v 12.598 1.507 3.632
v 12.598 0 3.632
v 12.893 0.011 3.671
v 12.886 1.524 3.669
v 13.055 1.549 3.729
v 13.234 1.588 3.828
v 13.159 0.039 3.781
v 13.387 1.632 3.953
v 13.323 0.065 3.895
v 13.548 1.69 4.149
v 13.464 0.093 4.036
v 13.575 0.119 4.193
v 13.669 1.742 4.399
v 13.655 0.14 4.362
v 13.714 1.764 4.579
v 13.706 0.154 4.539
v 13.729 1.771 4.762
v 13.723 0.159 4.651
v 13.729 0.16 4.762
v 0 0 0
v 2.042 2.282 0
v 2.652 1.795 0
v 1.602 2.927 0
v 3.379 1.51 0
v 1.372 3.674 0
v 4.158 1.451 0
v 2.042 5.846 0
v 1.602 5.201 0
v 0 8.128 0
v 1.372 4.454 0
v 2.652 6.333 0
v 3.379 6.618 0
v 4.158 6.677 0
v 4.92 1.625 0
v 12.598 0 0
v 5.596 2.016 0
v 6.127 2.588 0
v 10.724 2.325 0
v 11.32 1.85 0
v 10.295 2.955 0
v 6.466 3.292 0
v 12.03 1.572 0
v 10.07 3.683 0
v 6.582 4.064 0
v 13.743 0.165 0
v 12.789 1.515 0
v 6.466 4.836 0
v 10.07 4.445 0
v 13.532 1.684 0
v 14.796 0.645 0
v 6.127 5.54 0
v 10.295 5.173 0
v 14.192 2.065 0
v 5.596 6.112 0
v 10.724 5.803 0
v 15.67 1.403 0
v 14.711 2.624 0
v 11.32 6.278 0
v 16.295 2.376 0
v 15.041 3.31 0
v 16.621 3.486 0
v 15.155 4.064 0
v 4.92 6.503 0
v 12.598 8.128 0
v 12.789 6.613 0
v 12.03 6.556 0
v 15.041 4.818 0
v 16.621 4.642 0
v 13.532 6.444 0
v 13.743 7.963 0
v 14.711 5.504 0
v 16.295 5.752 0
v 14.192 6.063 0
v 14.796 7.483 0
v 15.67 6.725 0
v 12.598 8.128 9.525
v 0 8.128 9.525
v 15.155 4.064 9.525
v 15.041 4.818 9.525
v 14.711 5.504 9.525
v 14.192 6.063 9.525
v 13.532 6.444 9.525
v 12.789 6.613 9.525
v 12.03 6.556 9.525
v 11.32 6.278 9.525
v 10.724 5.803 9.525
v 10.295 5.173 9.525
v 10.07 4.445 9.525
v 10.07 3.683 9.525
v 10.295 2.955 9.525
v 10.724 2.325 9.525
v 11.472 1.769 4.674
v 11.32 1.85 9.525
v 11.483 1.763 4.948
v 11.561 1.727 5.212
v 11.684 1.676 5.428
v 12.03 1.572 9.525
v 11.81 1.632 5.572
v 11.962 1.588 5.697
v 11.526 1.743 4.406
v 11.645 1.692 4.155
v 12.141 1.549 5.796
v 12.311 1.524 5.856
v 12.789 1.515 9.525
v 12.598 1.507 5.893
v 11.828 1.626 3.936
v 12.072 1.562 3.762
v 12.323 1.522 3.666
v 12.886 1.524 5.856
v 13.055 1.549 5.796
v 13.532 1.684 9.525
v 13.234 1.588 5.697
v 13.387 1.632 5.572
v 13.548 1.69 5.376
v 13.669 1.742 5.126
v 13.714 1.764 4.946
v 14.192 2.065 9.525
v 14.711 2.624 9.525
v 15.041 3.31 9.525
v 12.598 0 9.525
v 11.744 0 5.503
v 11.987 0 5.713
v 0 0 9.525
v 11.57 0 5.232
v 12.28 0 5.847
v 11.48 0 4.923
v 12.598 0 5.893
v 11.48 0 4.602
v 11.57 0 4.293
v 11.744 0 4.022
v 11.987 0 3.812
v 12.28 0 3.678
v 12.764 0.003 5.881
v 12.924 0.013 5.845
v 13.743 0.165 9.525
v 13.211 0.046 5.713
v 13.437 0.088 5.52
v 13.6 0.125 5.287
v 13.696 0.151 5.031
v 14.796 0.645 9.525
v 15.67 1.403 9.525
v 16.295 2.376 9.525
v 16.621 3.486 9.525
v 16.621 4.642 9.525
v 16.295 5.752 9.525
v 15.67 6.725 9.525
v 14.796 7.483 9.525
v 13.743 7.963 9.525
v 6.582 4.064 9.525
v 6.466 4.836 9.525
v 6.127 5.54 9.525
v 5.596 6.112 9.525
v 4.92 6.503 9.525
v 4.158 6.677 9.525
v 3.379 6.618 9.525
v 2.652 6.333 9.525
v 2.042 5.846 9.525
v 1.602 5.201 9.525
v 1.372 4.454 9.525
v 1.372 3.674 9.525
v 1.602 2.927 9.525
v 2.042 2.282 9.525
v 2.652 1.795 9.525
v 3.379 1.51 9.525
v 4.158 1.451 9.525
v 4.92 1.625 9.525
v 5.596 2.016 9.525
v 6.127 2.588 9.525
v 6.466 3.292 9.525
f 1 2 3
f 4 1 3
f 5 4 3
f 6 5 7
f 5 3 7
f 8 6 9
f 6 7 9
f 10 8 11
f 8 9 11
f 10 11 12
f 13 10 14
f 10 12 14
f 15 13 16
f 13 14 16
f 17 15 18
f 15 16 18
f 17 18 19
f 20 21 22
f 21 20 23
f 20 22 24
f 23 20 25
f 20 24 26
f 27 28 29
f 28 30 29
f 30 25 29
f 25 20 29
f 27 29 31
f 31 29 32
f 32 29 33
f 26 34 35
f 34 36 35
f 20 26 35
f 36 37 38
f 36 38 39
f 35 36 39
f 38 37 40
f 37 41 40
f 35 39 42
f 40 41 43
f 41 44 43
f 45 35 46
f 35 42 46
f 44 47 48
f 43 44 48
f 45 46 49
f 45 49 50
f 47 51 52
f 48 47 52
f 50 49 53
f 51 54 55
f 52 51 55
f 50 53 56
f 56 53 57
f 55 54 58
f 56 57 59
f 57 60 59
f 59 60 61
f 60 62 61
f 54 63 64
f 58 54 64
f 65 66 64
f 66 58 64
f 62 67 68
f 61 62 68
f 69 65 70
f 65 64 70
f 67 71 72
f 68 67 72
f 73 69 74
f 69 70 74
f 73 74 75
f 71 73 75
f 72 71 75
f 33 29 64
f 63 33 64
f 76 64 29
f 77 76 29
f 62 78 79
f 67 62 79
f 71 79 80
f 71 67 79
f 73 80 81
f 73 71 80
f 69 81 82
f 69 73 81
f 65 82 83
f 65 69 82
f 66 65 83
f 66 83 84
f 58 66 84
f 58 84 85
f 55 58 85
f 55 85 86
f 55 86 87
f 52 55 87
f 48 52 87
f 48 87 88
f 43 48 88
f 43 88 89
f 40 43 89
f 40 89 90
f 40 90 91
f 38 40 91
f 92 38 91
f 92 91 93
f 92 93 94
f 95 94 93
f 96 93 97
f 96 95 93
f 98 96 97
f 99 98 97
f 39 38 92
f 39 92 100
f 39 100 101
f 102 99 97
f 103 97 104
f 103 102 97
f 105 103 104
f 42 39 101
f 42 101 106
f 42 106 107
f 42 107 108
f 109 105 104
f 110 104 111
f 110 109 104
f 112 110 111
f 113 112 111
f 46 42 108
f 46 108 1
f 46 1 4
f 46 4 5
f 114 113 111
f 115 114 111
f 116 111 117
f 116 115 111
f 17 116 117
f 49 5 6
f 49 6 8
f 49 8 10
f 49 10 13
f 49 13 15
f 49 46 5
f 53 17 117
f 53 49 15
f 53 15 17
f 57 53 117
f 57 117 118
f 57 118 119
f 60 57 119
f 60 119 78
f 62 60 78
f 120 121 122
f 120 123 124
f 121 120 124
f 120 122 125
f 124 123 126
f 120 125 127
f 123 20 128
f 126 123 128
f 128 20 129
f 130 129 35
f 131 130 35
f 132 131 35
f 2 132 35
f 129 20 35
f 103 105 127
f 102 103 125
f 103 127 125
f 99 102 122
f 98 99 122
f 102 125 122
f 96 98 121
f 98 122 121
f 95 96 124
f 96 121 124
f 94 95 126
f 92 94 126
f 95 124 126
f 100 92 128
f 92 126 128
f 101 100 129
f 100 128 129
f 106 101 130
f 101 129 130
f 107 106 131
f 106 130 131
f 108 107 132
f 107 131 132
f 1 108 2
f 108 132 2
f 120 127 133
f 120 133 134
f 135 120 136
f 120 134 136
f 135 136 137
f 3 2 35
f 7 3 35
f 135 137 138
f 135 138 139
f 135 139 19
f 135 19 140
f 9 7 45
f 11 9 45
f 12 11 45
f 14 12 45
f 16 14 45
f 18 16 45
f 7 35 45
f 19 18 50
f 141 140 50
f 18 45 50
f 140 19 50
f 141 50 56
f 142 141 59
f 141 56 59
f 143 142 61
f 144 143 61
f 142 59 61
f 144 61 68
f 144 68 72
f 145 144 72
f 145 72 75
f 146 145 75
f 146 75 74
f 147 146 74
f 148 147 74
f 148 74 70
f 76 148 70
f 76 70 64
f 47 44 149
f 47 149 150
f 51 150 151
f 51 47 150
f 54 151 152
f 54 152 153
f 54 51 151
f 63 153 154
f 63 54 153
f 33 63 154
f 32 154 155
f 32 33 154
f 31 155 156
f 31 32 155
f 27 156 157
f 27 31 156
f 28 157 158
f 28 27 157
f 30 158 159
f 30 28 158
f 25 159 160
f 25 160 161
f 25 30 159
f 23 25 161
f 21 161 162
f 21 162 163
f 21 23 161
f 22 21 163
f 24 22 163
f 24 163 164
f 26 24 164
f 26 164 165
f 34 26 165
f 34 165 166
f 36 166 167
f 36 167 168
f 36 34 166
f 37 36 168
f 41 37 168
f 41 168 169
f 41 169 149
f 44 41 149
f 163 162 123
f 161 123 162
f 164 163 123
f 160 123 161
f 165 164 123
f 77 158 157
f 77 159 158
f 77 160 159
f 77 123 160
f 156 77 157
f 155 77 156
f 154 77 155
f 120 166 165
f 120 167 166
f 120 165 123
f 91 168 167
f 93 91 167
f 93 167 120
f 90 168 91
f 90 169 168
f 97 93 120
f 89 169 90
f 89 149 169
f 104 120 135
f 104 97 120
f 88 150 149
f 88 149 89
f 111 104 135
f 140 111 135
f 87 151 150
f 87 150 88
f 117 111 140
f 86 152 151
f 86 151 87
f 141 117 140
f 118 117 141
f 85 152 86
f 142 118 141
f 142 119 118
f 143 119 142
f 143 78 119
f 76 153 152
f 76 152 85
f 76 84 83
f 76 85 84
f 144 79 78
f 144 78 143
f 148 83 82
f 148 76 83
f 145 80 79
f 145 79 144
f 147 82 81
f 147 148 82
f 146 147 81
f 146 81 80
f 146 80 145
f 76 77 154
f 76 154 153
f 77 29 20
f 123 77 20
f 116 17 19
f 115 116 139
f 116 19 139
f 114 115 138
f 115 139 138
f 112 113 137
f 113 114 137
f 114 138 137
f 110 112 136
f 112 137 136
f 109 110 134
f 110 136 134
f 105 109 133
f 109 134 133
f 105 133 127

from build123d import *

# Parameters (mm, degrees)
F0_R     = 2.62001
F0_R_2   = 2.55651
F1_DEPTH = 9.525
F3_DEPTH = 1.7719311324


with BuildPart() as f1:
    # F0 (on Top) → F1 (new body)
    with BuildSketch(Plane.XY):
        with BuildLine():
            Line((0, 8.128), (0, 0))
            Line((0, 0), (12.5984, 0))
            ThreePointArc((12.5984, 0), (16.6624, 4.064), (12.5984, 8.128))
            Line((12.5984, 8.128), (0, 8.128))
        make_face()
        with Locations((3.9624, 4.064)):
            Circle(F0_R, mode=Mode.SUBTRACT)
        with Locations((12.5984, 4.064)):
            Circle(F0_R_2, mode=Mode.SUBTRACT)
    extrude(amount=F1_DEPTH)

    # F2 (on face) → F3 (cut, through all)
    with BuildSketch(Plane.XZ):
        with BuildLine():
            Line((12.5984, 3.6322), (12.5984, 5.8928))
            ThreePointArc((12.5984, 5.8928), (11.4681, 4.7625), (12.5984, 3.6322))
        make_face()
        with BuildLine():
            ThreePointArc((12.5984, 3.6322), (13.3976427948, 3.9632572052), (13.7287, 4.7625))
            ThreePointArc((13.7287, 4.7625), (13.3976427948, 5.5617427948), (12.5984, 5.8928))
            Line((12.5984, 5.8928), (12.5984, 3.6322))
        make_face()
    extrude(amount=-F3_DEPTH, mode=Mode.SUBTRACT)


solid = f1.part
